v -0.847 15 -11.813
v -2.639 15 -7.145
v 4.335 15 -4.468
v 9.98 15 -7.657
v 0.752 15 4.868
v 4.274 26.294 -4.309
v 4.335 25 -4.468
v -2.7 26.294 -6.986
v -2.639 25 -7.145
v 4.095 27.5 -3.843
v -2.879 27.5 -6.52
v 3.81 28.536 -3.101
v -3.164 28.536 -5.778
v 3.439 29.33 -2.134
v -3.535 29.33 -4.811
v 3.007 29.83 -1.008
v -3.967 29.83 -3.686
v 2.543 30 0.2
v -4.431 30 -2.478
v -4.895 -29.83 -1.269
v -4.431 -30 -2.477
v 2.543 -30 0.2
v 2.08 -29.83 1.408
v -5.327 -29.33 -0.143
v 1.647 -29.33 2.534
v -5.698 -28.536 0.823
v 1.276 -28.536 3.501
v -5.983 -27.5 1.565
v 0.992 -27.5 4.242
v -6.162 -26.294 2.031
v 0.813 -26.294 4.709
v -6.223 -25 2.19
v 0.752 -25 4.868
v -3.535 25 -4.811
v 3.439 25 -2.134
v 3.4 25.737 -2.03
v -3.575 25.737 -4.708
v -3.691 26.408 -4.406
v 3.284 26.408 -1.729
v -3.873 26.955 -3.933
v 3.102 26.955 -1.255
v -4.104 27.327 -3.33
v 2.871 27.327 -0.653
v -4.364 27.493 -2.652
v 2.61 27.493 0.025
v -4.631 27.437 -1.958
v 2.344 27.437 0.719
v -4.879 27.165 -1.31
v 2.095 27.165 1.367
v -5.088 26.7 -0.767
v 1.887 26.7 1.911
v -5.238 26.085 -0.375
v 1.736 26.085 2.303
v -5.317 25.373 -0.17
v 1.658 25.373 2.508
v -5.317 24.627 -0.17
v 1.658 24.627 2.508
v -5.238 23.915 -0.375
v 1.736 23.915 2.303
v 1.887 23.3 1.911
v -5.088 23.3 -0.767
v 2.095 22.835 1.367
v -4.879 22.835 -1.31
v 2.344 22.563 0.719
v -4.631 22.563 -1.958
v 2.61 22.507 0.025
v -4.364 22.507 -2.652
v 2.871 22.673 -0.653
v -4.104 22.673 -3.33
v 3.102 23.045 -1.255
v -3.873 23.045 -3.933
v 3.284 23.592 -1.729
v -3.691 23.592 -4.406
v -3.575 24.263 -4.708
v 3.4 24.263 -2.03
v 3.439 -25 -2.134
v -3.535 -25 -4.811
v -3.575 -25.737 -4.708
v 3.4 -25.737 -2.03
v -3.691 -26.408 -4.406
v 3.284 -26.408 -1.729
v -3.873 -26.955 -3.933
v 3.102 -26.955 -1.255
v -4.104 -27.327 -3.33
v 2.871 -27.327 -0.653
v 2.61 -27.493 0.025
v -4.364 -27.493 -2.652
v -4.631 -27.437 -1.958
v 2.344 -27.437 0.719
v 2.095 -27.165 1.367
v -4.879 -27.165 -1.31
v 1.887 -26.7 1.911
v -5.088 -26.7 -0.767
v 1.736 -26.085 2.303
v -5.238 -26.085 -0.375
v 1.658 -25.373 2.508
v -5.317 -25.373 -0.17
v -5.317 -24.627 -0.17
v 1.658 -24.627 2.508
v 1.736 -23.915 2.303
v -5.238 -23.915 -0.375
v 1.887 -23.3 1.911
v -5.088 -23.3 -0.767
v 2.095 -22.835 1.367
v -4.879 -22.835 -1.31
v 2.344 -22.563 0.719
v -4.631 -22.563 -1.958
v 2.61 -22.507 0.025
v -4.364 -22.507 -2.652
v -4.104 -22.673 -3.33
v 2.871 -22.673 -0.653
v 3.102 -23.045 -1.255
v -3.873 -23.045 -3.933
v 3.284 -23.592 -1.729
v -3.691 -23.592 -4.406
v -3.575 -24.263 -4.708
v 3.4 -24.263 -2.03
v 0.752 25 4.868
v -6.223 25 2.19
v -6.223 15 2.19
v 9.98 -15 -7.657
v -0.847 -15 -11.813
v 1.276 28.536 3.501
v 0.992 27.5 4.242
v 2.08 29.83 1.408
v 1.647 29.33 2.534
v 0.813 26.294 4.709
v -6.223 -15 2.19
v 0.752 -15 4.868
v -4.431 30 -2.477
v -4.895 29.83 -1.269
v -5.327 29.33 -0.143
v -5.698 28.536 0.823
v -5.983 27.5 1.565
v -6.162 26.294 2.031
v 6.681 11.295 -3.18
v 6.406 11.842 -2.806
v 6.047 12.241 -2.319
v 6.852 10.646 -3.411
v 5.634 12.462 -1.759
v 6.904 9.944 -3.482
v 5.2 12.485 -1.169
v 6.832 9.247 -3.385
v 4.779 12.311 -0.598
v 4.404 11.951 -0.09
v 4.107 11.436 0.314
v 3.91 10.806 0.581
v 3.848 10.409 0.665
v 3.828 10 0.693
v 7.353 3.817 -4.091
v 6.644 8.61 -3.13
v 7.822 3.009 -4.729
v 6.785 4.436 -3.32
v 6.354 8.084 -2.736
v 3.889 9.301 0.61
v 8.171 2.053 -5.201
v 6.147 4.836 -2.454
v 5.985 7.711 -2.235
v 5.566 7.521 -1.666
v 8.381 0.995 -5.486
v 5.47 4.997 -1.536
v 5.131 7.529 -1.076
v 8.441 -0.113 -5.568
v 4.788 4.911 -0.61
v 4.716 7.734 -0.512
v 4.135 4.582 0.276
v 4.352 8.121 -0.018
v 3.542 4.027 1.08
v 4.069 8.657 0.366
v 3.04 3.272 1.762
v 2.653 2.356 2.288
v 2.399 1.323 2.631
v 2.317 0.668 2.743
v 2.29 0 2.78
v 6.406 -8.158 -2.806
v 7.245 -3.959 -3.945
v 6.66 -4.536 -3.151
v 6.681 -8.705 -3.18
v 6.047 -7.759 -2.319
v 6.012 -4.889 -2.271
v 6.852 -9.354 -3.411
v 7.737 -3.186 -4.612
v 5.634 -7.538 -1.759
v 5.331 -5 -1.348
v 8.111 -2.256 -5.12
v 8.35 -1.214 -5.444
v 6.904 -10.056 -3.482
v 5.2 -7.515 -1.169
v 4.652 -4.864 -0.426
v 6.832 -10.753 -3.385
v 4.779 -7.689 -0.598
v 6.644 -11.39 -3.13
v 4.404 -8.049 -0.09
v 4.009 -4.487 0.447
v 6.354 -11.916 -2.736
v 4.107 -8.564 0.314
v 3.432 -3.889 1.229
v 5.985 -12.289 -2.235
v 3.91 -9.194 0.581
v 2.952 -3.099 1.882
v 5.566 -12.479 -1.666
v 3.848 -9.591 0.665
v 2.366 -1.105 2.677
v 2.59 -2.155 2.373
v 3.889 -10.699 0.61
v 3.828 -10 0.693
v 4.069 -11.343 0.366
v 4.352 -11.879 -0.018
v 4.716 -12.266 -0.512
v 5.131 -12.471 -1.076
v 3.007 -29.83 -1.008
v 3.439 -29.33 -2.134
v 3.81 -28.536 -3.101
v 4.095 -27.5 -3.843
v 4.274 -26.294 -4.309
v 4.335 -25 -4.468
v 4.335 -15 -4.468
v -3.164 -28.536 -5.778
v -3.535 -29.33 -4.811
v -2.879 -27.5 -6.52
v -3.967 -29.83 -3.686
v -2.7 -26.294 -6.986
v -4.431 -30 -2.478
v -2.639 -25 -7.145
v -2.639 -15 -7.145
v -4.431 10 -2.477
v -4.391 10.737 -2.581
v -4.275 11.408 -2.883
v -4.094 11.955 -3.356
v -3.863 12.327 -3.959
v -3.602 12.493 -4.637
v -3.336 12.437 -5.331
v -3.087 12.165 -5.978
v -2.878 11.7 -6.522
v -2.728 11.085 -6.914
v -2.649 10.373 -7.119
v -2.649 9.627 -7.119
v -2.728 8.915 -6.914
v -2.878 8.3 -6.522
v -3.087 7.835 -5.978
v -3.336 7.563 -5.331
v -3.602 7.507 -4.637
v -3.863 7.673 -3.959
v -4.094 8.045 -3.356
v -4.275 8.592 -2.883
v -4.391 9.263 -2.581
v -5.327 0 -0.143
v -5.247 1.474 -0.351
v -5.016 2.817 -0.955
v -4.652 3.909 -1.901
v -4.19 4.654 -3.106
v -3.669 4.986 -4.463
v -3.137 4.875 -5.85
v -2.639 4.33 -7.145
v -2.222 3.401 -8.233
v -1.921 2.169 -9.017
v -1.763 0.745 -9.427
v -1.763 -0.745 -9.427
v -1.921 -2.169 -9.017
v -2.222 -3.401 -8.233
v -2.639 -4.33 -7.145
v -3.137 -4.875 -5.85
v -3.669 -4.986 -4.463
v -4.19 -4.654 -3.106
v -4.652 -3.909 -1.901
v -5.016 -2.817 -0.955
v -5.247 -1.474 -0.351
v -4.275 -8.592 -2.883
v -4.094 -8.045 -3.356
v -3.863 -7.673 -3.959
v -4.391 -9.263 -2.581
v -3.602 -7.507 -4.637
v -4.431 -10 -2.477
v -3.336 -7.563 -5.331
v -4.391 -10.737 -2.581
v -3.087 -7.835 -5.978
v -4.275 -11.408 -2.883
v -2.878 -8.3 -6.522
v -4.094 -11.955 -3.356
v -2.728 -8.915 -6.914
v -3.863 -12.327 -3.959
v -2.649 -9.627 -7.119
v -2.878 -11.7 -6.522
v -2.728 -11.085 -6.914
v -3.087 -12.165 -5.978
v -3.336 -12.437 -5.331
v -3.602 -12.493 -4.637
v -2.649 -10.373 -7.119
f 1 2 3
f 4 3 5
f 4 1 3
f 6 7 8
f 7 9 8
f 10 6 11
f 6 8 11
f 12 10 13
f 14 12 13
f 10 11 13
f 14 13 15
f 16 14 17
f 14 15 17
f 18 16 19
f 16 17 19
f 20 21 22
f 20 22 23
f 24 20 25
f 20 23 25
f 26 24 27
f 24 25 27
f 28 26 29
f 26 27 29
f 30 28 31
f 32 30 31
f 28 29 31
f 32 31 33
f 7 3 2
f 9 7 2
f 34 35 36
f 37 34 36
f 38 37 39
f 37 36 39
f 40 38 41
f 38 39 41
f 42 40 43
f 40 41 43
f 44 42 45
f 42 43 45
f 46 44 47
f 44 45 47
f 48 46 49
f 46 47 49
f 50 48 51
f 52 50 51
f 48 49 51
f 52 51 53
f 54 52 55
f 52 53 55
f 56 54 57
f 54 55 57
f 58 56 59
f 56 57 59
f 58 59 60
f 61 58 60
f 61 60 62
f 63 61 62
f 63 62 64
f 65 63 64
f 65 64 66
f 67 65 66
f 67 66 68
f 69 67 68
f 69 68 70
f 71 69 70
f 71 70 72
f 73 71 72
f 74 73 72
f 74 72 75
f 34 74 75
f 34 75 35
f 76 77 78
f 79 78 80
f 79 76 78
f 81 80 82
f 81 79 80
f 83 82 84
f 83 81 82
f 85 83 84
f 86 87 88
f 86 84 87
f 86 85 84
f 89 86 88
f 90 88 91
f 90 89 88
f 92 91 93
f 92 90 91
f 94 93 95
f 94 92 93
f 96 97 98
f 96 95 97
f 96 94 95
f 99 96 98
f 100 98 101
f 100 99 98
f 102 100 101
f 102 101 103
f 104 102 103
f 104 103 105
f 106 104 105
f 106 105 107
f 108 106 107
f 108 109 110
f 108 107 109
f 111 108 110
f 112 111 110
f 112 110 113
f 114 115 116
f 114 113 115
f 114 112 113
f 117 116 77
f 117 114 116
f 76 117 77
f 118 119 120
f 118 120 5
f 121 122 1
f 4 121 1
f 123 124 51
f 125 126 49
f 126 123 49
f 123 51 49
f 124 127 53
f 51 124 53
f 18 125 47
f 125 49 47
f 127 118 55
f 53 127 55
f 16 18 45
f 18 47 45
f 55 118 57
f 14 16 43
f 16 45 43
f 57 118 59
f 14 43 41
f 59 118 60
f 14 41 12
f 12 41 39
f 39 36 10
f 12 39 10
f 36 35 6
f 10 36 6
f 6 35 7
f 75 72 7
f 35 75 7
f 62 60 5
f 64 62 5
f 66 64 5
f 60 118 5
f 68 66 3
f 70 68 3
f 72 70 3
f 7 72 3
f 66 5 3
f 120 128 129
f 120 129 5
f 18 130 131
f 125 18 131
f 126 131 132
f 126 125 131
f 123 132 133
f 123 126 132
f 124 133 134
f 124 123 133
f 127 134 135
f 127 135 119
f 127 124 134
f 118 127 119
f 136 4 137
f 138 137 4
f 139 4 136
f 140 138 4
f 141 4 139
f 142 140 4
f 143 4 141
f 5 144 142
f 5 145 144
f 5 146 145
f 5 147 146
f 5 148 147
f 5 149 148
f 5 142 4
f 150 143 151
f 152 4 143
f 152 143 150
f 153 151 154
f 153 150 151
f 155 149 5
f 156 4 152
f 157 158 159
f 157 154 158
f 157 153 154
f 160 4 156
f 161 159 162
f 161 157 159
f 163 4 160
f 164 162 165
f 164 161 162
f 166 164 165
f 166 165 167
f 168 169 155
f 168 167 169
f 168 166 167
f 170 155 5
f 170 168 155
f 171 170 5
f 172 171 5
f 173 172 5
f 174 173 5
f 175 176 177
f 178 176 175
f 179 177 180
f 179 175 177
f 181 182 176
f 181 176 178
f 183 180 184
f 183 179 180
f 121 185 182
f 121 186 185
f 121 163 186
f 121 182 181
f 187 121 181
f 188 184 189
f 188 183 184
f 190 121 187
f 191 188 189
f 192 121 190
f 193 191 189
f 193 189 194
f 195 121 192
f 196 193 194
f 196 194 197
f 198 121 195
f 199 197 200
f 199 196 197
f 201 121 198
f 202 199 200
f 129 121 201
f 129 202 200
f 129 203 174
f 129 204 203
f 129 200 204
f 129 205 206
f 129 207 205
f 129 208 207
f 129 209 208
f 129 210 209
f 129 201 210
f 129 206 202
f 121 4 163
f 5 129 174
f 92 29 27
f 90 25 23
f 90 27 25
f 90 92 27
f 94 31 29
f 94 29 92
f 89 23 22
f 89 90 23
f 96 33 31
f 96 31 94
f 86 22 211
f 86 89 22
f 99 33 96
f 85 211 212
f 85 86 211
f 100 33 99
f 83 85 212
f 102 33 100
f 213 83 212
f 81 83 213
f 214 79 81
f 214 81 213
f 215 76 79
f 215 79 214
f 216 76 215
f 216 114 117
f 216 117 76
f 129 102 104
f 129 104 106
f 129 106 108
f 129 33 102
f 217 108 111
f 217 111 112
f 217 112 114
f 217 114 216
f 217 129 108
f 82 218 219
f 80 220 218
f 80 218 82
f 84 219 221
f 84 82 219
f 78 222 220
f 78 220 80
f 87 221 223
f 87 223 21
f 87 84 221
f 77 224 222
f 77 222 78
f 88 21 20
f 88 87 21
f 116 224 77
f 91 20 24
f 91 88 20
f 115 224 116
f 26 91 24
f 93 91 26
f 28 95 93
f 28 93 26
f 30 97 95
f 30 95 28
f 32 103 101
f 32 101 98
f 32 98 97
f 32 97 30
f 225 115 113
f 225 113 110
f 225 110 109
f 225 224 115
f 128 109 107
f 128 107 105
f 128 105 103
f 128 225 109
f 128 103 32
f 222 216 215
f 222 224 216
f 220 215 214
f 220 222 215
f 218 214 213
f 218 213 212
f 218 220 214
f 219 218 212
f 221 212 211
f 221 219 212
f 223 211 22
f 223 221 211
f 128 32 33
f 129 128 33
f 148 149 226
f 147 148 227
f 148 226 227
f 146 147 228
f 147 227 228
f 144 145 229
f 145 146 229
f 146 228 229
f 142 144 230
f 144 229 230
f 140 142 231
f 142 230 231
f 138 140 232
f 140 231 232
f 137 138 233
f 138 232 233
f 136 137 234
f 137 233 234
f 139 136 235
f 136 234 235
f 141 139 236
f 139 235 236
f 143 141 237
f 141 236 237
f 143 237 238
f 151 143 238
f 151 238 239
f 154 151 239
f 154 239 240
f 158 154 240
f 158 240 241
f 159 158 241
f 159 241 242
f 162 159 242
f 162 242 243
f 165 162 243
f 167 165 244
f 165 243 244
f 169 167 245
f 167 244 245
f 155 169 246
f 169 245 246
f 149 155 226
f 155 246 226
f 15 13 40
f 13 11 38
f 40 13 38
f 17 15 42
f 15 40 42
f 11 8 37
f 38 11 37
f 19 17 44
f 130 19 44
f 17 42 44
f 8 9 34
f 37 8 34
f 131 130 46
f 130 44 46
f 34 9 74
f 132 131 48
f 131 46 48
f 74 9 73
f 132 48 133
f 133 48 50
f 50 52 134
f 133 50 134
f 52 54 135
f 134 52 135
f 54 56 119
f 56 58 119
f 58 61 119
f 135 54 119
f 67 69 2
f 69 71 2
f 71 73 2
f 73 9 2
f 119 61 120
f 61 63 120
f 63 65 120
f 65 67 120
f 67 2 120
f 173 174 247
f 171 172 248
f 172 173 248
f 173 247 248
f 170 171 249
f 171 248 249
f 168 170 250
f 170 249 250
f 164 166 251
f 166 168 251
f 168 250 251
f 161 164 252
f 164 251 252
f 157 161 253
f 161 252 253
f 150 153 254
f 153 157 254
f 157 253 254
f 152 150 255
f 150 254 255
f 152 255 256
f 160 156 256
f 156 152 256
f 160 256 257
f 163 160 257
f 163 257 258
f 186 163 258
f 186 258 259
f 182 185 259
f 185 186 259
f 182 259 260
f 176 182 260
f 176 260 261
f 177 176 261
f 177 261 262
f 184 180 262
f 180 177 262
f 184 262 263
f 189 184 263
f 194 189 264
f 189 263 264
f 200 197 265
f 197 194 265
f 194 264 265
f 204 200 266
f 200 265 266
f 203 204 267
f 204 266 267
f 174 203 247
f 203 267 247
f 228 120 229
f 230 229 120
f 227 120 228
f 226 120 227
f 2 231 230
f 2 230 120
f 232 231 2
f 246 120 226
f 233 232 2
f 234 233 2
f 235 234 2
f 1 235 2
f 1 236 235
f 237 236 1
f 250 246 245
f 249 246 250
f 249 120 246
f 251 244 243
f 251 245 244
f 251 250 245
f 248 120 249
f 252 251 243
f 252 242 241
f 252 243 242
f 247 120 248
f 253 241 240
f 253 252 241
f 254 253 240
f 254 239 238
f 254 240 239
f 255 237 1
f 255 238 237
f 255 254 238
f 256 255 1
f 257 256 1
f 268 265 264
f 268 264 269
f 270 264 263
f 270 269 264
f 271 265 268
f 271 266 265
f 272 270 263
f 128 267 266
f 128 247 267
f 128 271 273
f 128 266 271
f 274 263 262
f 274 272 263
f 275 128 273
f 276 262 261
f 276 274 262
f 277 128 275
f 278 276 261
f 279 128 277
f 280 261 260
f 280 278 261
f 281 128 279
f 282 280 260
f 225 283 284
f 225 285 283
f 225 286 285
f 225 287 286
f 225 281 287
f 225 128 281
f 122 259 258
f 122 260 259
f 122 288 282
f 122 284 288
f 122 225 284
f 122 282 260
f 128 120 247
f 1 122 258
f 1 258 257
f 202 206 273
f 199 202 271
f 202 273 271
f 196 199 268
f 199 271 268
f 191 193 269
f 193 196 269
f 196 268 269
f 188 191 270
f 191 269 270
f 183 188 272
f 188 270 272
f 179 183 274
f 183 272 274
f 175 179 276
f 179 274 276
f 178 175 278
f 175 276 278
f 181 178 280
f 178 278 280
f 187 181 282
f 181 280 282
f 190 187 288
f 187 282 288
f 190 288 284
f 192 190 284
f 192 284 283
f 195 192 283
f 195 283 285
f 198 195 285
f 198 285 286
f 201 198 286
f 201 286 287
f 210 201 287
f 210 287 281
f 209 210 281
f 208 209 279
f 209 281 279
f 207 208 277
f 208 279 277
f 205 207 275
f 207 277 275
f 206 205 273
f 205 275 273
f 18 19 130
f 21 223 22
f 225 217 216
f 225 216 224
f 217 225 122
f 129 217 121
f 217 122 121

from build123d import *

# Parameters (mm, degrees)
BOSS_EXTRUDE1_DEPTH  = 15
CUT_EXTRUDE1_DEPTH   = 43.992404265
SKETCH3_R            = 5
CUT_EXTRUDE2_DEPTH   = 36.004455062
SKETCH5_W            = 10.737519515
SKETCH5_H            = 30
SKETCH5_W_2          = 6.95
CUT_EXTRUDE3_DEPTH   = 36.004455062
SKETCH7_R            = 2.5
CUT_EXTRUDE4_DEPTH   = 24.248431868
BOSS_EXTRUDE4_DEPTH  = 15
SKETCH9_R            = 2.5
CUT_EXTRUDE5_DEPTH   = 15
FILLET1_R            = 5
FILLET1_OF_MIRROR1_R = 5


with BuildPart() as part:
    # Sketch1 → Boss-Extrude1 (new, symmetric)
    with BuildSketch(Plane(origin=(0, 0, 0), x_dir=(1, 0, 0), z_dir=(0, 1, 0))):
        Polygon((-9.48841315, -9.301961234), (-0.940151386, -8.006660352), (17.861436312, 17.510450435), (15.605946265, 22.576364023), (9.067678571, 25.086169843), (2.607936691, 22.210107458), align=None)
    extrude(amount=BOSS_EXTRUDE1_DEPTH, both=True)

    # Sketch2 → Cut-Extrude1 (cut, through all)
    with BuildSketch(Plane.XZ.offset(15)):
        Polygon((-9.48841315, 9.301961234), (2.607936691, -22.210107458), (9.067678571, -25.086169843), (15.605946265, -22.576364023), (17.861436312, -17.510450435), (-0.940151386, 8.006660352), align=None)
        Polygon((-8.713652873, 8.678855764), (3.000506472, -21.837572646), (9.081845433, -24.545159197), (15.233411453, -22.183794243), (17.286339277, -17.572842857), (-1.219829574, 7.543331818), align=None, mode=Mode.SUBTRACT)
    extrude(amount=-CUT_EXTRUDE1_DEPTH, mode=Mode.SUBTRACT)

    # Sketch3 → Cut-Extrude2 (cut, through all)
    with BuildSketch(Plane(origin=(-4.690935448, 0, -1.800681409), x_dir=(-0.3583679495453122, 0, 0.9335804264971972), z_dir=(-0.9335804264971972, 0, -0.3583679495453122))):
        with Locations((-3.224896221, 0)):
            Circle(SKETCH3_R)
    extrude(amount=-CUT_EXTRUDE2_DEPTH, mode=Mode.SUBTRACT)

    # Sketch5 → Cut-Extrude3 (cut, through all)
    with BuildSketch(Plane(origin=(-4.690935448, 0, -1.800681409), x_dir=(-0.35836794954531215, 0, 0.9335804264971973), z_dir=(-0.9335804264971973, 0, -0.35836794954531215))):
        with Locations((-16.093655978, 0)):
            Rectangle(SKETCH5_W, SKETCH5_H)
        with Locations((7.750103779, 0)):
            Rectangle(SKETCH5_W_2, SKETCH5_H)
    extrude(amount=-CUT_EXTRUDE3_DEPTH, mode=Mode.SUBTRACT)


with BuildPart() as cut_extrude3_kept_piece:
    # of the separate pieces the step leaves, the one the design keeps (cut_extrude3_pieces_kept)
    add(part.part.solids().sort_by_distance((-6.222995624, -15, 2.1904718))[0])

    # Sketch7 → Cut-Extrude4 (cut, through all)
    with BuildSketch(Plane(origin=(-4.690935448, 0, -1.800681409), x_dir=(-0.35836794954531215, 0, 0.9335804264971973), z_dir=(-0.9335804264971973, 0, -0.35836794954531215))):
        with Locations((-3.224896221, 10)):
            Circle(SKETCH7_R)
        with Locations((-3.224896221, -10)):
            Circle(SKETCH7_R)
    extrude(amount=-CUT_EXTRUDE4_DEPTH, mode=Mode.SUBTRACT)

    # Sketch8 → Boss-Extrude4 (add)
    with BuildSketch(Plane(origin=(0, 15, 0), x_dir=(1, 0, 0), z_dir=(0, 1, 0))):
        Polygon((-2.639316128, 7.145332465), (-6.222995624, -2.1904718), (0.751589516, -4.867764195), (4.335269011, 4.46804007), align=None)
    boss_extrude4 = extrude(amount=BOSS_EXTRUDE4_DEPTH)

    # Sketch9 → Cut-Extrude5 (cut)
    with BuildSketch(Plane(origin=(2.283649691, 0, 0.876610985), x_dir=(0.3583679495453119, 0, -0.9335804264971973), z_dir=(0.9335804264971973, 0, 0.3583679495453119))):
        with Locations((0.724896221, 25)):
            Circle(SKETCH9_R)
    cut_extrude5 = extrude(amount=-CUT_EXTRUDE5_DEPTH, mode=Mode.SUBTRACT)

    # Fillet1
    fillet1_edges = [cut_extrude3_kept_piece.edges().sort_by_distance(p)[0] for p in [
        (-2.735703054, 30, 3.529117997),
        (0.847976442, 30, -5.806686268),
    ]]
    fillet(fillet1_edges, radius=FILLET1_R - 0.0001)  # a hair under: the kernel refuses the full size

    # Mirror1: Boss-Extrude4, Cut-Extrude5 across plane
    add(boss_extrude4.mirror(Plane.ZX))
    add(cut_extrude5.mirror(Plane.ZX), mode=Mode.SUBTRACT)

    # Fillet1 of Mirror1
    fillet1_of_mirror1_edges = [cut_extrude3_kept_piece.edges().sort_by_distance(p)[0] for p in [
        (-2.735703054, -30, 3.529117997),
        (0.847976442, -30, -5.806686268),
    ]]
    fillet(fillet1_of_mirror1_edges, radius=FILLET1_OF_MIRROR1_R - 0.0001)  # a hair under: the kernel refuses the full size


solid = cut_extrude3_kept_piece.part
